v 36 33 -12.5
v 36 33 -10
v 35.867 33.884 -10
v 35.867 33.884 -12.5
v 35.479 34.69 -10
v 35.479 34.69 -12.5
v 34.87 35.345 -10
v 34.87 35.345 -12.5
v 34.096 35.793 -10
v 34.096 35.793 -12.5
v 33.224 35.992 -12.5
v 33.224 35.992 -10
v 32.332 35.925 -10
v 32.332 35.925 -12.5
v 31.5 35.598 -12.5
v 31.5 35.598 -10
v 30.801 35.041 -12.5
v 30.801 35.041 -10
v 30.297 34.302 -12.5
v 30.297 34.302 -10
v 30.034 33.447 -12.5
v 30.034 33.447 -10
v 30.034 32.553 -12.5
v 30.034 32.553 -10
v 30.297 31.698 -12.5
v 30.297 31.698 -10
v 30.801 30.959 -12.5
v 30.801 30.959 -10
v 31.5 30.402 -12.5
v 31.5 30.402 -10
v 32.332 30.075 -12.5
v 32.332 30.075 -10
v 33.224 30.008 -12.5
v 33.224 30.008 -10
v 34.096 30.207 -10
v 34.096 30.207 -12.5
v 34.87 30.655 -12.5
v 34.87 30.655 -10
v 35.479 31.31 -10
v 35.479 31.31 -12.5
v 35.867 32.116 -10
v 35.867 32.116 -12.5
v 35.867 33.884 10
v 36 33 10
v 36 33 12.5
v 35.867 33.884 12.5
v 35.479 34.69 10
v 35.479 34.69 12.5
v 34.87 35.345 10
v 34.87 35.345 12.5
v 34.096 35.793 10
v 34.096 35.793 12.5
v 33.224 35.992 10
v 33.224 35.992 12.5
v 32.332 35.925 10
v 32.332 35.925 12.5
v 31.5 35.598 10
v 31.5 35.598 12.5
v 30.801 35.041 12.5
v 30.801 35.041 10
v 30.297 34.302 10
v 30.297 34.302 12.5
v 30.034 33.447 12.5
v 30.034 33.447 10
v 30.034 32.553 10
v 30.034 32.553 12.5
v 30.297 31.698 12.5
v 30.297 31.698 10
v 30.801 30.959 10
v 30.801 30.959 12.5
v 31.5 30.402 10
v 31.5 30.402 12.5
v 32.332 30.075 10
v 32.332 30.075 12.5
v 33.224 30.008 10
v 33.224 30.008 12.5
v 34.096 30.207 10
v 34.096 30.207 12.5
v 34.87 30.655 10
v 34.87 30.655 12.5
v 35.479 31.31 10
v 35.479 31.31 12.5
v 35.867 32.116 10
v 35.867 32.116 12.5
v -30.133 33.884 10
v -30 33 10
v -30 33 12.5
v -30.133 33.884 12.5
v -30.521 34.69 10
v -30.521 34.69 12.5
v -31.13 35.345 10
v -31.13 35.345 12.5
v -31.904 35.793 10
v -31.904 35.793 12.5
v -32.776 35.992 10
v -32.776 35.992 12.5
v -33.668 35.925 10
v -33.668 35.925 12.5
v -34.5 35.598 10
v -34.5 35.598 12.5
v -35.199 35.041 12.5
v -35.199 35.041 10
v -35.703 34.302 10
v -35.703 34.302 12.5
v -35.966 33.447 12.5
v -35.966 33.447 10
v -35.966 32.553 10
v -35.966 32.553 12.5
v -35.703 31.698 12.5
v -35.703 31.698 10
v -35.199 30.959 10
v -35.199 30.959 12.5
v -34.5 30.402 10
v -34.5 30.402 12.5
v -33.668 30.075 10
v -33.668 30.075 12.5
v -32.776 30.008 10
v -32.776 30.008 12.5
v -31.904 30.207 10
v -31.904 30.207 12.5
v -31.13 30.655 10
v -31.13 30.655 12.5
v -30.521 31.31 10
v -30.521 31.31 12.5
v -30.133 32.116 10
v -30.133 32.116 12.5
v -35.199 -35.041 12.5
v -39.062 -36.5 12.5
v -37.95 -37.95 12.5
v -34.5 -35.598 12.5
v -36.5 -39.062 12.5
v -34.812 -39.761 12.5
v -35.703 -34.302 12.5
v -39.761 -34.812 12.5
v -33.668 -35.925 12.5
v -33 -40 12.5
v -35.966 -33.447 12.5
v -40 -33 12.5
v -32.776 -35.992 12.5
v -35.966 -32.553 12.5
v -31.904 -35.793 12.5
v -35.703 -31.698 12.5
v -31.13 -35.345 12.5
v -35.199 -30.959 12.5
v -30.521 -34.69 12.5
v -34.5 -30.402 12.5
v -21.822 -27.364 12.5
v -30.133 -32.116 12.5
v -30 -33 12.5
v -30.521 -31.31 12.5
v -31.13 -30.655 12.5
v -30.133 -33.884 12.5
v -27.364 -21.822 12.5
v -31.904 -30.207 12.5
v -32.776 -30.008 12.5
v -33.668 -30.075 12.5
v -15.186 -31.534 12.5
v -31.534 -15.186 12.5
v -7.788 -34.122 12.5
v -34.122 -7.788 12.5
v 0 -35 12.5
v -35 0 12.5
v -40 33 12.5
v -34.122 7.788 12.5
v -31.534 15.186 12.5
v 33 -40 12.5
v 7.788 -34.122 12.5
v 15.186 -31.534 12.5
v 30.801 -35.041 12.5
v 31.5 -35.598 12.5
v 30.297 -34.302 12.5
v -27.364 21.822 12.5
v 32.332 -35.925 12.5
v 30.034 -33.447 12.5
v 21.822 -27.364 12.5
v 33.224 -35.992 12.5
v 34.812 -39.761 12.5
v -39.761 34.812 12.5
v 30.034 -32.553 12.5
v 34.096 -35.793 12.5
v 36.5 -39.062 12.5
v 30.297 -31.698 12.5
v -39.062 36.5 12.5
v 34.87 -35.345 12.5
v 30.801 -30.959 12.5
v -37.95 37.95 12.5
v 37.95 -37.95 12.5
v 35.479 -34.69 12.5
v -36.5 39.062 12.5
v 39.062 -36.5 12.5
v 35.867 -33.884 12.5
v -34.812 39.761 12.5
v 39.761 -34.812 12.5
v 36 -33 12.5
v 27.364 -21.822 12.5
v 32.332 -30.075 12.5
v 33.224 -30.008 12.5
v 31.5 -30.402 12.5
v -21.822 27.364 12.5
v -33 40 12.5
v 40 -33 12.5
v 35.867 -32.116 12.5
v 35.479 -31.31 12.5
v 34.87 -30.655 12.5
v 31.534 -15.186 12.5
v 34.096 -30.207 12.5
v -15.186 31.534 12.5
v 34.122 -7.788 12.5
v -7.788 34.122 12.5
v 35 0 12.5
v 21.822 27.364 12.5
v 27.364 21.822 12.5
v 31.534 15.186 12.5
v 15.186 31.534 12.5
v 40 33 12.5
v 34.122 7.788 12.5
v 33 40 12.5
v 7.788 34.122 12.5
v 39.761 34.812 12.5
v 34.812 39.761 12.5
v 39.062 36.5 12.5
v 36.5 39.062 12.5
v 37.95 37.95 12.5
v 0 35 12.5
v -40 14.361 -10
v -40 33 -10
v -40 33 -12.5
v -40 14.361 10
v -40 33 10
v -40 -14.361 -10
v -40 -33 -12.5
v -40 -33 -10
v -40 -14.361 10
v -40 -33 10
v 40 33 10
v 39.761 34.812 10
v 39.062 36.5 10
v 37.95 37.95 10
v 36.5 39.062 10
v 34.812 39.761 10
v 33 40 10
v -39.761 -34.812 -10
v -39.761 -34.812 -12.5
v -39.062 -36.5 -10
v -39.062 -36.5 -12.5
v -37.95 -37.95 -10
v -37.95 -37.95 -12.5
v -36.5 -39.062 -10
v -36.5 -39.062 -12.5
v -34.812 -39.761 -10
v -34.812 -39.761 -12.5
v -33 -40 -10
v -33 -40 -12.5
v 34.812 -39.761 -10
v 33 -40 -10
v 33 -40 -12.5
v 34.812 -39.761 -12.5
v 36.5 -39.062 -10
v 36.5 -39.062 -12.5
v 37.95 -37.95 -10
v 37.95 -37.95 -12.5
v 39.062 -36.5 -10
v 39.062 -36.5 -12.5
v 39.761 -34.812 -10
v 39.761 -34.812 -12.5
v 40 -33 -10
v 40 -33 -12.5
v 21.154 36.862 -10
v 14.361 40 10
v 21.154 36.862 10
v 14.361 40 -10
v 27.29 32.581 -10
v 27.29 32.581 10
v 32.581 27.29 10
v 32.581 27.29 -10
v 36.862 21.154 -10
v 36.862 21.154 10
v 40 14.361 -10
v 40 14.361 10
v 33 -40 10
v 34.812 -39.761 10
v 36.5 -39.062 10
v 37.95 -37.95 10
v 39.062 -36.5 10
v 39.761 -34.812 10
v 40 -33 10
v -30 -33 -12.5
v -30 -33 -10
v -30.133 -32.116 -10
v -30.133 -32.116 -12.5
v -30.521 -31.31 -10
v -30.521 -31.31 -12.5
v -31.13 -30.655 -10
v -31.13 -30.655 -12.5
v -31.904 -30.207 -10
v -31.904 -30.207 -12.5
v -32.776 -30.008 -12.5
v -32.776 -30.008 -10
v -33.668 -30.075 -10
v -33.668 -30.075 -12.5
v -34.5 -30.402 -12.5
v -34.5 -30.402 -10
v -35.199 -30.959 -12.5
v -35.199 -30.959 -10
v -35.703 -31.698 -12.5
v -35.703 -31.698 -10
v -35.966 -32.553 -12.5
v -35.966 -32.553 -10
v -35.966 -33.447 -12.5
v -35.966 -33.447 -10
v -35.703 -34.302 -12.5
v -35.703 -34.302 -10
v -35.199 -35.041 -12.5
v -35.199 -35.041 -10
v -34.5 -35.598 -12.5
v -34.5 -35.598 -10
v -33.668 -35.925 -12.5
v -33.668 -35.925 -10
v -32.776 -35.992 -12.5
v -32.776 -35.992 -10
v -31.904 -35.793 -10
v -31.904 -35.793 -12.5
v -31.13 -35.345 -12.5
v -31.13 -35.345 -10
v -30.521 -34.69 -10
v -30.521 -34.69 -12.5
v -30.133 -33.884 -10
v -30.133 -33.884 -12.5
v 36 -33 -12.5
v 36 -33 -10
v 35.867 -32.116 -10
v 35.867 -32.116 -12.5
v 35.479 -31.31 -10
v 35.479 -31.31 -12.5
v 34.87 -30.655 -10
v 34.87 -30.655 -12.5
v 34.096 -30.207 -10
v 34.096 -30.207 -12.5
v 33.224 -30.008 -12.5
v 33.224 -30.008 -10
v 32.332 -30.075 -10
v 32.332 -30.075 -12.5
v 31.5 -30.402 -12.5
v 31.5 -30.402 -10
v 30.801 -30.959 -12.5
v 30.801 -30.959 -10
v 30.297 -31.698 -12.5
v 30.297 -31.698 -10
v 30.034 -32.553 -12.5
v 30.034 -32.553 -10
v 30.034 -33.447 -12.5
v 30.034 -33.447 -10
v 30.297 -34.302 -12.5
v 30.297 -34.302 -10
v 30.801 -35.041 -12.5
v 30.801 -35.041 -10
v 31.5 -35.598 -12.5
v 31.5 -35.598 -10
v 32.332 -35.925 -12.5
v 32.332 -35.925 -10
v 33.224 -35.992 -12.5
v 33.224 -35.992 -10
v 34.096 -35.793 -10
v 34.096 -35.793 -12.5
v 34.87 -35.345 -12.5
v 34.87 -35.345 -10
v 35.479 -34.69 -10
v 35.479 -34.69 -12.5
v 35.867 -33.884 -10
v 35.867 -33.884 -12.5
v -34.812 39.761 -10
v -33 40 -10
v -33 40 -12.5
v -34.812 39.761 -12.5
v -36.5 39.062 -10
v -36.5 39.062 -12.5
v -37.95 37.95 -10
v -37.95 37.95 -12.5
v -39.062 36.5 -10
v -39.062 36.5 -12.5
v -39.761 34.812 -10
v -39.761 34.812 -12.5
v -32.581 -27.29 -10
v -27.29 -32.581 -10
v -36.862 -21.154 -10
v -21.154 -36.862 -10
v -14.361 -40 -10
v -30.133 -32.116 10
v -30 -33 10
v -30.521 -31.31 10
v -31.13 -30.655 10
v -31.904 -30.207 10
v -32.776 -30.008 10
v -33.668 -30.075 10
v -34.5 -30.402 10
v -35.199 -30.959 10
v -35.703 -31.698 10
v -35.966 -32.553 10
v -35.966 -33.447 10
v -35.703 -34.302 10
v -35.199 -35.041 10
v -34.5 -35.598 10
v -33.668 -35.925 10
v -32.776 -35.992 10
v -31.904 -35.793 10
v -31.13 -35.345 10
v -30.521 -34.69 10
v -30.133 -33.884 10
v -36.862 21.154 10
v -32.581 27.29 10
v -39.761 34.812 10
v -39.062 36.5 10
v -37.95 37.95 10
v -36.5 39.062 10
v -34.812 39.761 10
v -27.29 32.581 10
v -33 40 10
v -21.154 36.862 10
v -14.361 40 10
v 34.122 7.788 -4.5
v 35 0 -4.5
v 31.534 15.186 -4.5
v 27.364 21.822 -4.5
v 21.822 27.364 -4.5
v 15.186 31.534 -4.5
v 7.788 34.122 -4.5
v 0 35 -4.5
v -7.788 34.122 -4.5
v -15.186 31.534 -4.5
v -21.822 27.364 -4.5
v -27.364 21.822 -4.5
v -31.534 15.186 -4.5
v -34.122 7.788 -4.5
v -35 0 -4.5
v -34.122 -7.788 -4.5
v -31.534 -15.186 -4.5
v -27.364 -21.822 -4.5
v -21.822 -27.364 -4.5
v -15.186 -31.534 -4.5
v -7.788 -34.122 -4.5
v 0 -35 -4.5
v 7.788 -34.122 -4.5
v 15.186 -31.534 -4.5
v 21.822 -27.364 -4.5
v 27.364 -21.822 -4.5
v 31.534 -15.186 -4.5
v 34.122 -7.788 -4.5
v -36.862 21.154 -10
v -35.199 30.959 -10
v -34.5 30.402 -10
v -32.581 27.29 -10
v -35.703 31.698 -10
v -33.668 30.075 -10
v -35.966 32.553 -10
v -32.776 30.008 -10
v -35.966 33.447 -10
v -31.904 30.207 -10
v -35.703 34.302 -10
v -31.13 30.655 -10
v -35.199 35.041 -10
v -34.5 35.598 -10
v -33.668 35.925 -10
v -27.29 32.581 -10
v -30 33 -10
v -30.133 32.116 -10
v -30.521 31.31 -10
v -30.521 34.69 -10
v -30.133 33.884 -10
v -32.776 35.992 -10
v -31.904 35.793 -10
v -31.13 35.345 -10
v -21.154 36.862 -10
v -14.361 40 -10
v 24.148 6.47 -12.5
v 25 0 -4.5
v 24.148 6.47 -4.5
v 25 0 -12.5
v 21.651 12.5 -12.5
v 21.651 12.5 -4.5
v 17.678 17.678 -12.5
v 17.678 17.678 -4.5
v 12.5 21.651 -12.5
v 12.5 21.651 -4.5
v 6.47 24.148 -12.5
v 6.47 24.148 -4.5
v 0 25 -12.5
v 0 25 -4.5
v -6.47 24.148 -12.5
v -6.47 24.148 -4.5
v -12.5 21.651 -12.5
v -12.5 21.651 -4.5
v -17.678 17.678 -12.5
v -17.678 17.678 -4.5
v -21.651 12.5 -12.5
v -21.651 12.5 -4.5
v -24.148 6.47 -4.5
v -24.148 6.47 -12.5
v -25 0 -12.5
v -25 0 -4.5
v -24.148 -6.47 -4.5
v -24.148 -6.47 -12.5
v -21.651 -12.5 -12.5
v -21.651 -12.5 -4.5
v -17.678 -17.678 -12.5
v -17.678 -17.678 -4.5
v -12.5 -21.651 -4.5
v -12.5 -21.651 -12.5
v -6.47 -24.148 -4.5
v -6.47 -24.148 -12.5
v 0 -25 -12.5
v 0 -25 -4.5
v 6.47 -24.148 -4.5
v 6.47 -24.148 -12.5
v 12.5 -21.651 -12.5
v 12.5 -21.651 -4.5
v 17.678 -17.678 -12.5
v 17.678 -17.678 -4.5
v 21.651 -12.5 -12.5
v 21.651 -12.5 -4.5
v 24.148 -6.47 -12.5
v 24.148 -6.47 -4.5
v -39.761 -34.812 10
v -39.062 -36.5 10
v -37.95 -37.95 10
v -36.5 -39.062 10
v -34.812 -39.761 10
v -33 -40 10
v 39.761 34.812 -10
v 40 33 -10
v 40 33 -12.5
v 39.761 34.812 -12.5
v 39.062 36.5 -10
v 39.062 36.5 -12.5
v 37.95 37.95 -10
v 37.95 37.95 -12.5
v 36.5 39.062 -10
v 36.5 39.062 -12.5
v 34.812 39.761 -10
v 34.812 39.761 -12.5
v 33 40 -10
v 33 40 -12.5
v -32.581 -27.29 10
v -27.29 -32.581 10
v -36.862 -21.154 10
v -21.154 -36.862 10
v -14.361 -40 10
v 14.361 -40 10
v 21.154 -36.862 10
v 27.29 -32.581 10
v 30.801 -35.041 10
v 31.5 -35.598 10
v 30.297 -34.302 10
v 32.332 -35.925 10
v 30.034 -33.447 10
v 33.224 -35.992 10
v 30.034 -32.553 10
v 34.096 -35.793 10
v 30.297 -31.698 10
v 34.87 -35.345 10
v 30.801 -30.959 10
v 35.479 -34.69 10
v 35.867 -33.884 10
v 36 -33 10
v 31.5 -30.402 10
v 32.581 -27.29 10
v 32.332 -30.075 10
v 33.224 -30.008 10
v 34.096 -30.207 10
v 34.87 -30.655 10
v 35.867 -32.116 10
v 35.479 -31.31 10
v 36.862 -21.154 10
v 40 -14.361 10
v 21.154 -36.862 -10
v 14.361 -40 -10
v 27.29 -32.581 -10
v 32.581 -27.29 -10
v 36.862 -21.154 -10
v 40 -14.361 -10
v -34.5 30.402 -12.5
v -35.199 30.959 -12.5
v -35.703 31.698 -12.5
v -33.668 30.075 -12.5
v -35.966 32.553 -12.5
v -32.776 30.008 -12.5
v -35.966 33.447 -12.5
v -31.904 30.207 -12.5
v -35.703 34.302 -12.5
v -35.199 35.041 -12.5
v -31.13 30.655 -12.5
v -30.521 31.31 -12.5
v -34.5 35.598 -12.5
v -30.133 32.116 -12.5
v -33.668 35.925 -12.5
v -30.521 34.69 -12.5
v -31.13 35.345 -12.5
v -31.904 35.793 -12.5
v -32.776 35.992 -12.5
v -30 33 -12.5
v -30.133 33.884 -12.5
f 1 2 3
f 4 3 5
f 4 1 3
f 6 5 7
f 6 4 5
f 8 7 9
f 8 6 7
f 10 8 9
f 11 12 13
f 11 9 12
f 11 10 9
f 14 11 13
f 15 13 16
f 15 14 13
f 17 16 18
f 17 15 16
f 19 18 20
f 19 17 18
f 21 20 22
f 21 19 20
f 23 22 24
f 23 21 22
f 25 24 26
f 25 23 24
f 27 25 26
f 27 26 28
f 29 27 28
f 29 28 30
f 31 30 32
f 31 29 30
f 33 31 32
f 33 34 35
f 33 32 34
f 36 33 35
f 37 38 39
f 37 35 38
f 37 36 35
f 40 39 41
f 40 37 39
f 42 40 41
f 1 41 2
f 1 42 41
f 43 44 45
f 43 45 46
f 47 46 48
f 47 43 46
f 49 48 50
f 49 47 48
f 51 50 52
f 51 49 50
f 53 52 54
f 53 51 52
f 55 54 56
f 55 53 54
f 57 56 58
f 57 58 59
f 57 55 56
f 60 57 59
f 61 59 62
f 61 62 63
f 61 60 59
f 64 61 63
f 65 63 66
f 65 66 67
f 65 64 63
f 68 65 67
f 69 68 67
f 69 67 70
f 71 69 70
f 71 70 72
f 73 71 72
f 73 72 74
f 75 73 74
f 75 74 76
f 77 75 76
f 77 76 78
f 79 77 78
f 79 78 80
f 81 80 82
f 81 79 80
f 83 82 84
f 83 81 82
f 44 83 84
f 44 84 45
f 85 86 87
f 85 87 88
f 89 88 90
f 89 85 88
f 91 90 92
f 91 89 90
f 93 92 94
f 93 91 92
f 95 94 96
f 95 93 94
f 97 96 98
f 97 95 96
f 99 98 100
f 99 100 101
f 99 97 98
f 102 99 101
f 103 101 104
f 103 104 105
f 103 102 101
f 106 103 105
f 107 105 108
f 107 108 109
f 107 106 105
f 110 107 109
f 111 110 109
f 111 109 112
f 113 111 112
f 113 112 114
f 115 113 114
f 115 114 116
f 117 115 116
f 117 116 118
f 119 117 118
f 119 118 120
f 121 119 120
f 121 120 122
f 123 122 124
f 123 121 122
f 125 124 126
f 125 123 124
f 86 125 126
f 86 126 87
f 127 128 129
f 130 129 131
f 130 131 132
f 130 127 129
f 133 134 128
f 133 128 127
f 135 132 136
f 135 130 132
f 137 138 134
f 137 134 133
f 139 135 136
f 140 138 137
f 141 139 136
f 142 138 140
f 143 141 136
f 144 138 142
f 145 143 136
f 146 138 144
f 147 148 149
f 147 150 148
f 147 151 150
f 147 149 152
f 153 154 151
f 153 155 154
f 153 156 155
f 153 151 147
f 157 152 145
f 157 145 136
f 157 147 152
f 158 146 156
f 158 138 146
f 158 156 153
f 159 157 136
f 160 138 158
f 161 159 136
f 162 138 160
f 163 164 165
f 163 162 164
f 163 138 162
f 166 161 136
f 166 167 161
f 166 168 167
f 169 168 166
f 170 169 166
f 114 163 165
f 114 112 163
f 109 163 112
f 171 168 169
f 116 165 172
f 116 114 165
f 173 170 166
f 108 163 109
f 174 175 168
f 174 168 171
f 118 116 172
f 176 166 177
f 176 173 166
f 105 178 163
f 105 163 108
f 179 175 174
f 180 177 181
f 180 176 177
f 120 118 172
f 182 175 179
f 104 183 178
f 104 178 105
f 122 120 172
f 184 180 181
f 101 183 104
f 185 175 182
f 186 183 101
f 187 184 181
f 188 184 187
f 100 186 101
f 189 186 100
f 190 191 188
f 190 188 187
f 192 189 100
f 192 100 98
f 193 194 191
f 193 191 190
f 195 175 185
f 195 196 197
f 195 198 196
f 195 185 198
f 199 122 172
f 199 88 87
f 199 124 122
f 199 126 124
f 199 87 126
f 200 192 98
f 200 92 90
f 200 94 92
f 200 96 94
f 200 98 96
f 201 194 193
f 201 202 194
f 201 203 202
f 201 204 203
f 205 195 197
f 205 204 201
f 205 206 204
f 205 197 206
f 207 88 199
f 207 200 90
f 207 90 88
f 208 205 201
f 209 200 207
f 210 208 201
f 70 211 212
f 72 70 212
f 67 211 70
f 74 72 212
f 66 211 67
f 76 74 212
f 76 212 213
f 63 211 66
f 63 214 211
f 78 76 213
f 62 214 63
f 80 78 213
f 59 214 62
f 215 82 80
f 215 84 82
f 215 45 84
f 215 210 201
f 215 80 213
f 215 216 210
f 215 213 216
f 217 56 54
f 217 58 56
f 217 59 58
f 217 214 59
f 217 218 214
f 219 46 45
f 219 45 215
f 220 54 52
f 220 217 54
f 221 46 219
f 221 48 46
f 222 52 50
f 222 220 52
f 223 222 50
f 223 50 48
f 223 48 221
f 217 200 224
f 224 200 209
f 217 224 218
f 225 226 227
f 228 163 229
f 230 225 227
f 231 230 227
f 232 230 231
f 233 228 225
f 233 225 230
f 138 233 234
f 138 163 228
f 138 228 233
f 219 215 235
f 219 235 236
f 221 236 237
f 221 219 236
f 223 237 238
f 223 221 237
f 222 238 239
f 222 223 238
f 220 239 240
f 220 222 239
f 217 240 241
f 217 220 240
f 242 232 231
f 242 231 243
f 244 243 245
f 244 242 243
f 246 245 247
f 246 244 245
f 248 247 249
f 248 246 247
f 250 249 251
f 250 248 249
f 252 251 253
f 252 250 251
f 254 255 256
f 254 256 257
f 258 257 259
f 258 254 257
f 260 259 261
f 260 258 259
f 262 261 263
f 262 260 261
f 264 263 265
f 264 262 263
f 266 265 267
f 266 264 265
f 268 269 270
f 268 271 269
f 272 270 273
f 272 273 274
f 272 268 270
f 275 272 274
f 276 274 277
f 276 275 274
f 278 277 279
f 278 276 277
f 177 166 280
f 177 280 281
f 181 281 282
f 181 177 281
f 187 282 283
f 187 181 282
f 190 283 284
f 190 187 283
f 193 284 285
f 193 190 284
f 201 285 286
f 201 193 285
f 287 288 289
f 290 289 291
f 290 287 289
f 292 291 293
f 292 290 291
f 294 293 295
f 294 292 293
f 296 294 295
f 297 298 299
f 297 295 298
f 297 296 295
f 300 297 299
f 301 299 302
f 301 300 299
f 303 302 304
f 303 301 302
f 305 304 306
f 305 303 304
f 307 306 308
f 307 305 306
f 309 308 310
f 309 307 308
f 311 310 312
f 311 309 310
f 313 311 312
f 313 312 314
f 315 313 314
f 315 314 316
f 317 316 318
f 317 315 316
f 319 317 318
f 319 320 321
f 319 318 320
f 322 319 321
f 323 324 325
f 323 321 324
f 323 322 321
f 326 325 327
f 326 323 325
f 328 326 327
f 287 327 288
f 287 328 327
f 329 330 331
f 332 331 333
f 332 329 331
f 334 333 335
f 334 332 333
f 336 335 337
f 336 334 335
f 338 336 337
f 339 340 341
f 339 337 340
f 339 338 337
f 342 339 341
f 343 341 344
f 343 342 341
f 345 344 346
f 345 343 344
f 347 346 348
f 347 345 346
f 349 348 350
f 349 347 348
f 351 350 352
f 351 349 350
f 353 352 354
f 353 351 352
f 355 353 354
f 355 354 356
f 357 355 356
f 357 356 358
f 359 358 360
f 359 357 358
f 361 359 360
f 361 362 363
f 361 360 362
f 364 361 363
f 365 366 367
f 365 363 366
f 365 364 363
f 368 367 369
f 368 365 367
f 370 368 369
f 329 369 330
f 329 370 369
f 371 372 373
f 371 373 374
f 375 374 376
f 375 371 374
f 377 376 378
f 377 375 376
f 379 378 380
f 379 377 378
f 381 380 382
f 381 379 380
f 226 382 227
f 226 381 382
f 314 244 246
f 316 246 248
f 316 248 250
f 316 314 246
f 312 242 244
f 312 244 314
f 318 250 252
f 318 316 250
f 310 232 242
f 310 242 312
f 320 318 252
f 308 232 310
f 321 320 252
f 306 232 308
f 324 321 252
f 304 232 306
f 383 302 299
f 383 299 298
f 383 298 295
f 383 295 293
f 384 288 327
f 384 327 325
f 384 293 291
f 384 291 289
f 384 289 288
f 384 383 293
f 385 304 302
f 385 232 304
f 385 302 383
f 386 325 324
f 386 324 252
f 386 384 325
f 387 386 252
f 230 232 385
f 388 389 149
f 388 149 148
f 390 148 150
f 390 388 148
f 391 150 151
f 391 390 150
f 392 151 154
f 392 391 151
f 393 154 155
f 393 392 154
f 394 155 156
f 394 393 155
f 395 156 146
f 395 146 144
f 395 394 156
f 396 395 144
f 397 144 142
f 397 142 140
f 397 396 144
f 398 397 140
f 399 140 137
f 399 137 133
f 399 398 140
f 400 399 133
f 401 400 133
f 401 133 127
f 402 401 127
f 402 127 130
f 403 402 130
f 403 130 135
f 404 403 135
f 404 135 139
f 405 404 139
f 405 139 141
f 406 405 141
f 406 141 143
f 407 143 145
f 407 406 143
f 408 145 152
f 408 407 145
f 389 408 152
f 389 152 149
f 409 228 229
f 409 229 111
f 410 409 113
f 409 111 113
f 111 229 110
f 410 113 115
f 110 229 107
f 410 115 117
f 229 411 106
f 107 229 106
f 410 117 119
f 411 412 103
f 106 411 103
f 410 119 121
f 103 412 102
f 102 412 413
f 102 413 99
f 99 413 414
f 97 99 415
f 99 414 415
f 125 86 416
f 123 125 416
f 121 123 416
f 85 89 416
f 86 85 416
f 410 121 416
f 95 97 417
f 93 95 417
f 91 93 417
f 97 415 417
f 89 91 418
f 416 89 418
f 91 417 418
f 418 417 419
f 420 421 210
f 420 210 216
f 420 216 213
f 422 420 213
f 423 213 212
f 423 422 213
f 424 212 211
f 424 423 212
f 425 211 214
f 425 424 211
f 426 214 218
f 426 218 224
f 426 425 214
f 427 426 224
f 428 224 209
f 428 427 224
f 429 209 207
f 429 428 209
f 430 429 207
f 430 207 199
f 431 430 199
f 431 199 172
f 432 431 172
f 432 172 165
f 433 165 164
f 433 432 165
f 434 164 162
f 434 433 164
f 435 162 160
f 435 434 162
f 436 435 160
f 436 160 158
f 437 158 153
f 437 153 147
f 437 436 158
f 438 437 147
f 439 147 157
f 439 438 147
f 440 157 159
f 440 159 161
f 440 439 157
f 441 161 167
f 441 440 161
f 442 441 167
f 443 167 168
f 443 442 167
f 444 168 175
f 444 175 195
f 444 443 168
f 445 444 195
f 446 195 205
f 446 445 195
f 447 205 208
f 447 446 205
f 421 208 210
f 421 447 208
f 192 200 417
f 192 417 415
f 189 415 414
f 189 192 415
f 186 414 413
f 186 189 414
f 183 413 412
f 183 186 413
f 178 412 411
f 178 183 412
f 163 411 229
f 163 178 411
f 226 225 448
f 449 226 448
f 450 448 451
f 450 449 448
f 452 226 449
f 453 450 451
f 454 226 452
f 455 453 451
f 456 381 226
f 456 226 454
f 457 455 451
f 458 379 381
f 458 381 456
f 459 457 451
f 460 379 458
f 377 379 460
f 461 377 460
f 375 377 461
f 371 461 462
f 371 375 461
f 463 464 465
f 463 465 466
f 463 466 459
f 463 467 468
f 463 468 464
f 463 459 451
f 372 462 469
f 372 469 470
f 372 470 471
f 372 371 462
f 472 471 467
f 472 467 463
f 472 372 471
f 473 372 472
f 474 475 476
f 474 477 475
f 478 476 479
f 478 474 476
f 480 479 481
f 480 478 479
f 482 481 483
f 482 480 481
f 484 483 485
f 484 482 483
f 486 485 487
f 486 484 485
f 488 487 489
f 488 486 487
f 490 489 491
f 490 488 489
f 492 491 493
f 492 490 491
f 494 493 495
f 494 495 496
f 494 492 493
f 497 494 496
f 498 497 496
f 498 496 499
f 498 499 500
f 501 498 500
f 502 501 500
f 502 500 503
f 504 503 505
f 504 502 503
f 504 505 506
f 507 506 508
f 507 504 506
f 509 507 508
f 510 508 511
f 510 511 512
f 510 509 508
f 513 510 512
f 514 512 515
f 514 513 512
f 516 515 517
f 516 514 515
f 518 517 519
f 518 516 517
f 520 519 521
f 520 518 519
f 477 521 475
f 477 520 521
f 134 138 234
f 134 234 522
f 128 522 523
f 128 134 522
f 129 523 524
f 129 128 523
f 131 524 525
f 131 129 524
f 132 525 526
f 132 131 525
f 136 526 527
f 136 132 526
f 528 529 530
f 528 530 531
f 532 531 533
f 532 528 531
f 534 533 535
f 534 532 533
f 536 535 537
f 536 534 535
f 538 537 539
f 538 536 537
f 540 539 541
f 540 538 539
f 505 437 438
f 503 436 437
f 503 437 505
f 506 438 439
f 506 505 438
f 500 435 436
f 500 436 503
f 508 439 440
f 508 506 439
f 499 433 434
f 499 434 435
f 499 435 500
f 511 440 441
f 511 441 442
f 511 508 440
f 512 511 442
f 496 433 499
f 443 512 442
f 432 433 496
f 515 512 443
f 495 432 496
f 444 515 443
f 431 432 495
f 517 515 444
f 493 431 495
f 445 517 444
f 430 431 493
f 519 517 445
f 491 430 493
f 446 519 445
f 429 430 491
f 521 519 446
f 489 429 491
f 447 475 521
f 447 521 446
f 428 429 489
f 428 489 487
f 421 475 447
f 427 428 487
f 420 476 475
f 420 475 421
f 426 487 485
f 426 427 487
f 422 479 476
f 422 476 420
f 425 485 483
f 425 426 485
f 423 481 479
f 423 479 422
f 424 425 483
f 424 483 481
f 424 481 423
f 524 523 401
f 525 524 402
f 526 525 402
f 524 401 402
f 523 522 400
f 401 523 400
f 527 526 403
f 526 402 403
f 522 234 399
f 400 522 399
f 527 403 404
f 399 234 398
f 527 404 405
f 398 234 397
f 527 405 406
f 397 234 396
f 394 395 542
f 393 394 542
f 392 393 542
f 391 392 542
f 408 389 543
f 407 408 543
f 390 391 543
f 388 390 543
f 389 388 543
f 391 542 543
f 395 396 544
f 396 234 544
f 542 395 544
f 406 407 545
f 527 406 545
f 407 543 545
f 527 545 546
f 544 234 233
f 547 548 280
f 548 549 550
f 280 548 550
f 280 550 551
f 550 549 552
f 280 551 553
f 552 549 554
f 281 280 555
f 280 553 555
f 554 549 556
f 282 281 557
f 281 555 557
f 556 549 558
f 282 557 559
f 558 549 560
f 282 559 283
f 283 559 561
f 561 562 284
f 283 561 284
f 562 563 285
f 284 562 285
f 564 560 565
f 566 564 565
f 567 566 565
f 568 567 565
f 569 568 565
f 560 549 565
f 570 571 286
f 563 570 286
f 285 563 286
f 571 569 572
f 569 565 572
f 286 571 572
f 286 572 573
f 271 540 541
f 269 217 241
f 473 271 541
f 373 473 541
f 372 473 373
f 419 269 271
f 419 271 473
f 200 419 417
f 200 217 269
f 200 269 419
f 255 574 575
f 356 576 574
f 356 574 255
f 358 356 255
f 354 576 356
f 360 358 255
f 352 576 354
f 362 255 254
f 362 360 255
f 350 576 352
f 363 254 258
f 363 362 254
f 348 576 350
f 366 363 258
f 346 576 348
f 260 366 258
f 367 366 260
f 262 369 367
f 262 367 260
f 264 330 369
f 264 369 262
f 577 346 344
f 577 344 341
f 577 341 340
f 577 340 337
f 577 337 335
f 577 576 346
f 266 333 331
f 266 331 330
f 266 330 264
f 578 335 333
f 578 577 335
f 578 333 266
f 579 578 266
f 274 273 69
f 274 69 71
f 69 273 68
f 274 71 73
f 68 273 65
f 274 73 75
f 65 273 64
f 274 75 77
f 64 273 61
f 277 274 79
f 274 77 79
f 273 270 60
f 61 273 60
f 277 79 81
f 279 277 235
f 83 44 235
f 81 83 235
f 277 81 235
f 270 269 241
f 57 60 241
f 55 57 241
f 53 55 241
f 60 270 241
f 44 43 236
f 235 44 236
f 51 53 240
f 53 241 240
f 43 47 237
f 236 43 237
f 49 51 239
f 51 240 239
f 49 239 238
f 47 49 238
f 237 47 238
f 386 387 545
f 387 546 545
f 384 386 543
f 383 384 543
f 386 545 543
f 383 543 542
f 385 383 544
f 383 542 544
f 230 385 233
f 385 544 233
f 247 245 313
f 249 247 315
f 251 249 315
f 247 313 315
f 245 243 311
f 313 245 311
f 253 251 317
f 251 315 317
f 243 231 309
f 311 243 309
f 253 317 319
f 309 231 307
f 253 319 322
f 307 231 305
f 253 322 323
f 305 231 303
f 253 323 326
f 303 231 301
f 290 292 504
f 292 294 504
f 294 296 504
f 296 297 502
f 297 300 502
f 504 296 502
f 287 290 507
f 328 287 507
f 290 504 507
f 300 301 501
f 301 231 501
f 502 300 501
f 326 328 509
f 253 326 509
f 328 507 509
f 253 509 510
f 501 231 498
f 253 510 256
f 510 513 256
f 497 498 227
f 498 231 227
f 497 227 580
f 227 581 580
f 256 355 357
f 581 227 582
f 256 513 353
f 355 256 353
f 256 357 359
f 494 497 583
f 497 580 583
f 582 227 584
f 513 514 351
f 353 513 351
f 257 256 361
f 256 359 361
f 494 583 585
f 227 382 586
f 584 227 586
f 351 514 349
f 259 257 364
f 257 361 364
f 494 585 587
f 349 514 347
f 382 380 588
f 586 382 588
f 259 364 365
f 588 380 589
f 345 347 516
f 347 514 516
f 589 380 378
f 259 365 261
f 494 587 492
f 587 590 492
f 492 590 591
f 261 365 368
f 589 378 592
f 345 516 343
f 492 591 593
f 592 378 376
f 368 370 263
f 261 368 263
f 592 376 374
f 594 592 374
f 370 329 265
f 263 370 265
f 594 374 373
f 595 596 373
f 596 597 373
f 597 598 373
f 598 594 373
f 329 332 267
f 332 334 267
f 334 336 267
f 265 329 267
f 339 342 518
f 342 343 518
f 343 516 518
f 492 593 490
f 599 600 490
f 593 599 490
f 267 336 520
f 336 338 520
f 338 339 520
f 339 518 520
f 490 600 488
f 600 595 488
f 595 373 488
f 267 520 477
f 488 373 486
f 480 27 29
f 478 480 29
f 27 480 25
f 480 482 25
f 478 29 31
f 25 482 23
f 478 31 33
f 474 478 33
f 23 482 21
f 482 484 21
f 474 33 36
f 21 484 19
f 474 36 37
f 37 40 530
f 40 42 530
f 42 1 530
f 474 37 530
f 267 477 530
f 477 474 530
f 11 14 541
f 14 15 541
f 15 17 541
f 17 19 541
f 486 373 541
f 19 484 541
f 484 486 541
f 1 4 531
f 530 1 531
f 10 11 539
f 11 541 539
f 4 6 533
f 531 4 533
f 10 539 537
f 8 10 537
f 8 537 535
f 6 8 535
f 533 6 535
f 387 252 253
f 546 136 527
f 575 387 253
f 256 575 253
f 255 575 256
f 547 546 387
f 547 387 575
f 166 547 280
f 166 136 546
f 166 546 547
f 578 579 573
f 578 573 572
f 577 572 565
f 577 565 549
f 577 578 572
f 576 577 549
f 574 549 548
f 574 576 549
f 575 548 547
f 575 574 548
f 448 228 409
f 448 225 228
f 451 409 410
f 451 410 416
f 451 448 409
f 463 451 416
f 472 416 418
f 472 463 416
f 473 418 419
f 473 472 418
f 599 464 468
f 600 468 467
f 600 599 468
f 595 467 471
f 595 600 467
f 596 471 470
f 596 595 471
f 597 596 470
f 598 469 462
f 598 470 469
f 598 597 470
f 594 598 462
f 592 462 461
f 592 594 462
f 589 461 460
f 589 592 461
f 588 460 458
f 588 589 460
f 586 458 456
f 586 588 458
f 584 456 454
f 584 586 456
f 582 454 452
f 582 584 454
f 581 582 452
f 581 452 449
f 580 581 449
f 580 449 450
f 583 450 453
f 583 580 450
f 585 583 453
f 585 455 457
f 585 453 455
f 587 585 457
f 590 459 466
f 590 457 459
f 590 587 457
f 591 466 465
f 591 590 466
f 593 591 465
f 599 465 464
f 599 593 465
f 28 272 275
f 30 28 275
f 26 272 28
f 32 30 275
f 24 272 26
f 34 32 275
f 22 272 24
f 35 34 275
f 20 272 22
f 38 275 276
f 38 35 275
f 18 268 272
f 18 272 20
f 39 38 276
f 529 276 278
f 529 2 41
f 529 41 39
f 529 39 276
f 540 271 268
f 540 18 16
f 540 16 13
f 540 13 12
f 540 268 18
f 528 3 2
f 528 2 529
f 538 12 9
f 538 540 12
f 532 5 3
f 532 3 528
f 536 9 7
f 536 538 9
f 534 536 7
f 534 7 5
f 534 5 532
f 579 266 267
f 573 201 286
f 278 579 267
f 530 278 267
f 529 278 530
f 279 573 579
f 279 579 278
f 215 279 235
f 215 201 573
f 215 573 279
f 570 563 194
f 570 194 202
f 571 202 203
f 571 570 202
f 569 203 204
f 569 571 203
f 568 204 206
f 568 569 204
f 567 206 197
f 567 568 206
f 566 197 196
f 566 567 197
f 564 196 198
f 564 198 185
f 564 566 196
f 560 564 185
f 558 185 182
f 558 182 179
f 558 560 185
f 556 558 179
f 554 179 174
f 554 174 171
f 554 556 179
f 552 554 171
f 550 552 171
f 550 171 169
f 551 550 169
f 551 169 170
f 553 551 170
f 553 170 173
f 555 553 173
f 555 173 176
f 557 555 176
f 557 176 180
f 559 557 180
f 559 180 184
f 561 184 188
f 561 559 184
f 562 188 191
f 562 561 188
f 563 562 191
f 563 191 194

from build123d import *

# Parameters (mm, degrees)
SKETCH1_R           = 25
SKETCH1_R_2         = 3
BOSS_EXTRUDE1_DEPTH = 12.5
CUT_EXTRUDE2_DEPTH  = 10
CUT_EXTRUDE3_START  = -4.5
SKETCH2_4_R         = 35
SKETCH2_4_R_2       = 25
CUT_EXTRUDE3_DEPTH  = 17


with BuildPart() as part:
    # Sketch1 → Boss-Extrude1 (new, symmetric)
    with BuildSketch(Plane.XY):
        with BuildLine():
            Line((-33, -40), (33, -40))
            ThreePointArc((33, -40), (37.949747468, -37.949747468), (40, -33))
            Line((40, -33), (40, 33))
            ThreePointArc((40, 33), (37.949747468, 37.949747468), (33, 40))
            Line((33, 40), (-33, 40))
            ThreePointArc((-33, 40), (-37.949747468, 37.949747468), (-40, 33))
            Line((-40, 33), (-40, -33))
            ThreePointArc((-40, -33), (-37.949747468, -37.949747468), (-33, -40))
        make_face()
        Circle(SKETCH1_R, mode=Mode.SUBTRACT)
        with Locations((-33, 33)):
            Circle(SKETCH1_R_2, mode=Mode.SUBTRACT)
        with Locations((33, 33)):
            Circle(SKETCH1_R_2, mode=Mode.SUBTRACT)
        with Locations((-33, -33)):
            Circle(SKETCH1_R_2, mode=Mode.SUBTRACT)
        with Locations((33, -33)):
            Circle(SKETCH1_R_2, mode=Mode.SUBTRACT)
    extrude(amount=BOSS_EXTRUDE1_DEPTH, both=True)

    # Sketch2 → Cut-Extrude2 (cut, symmetric)
    with BuildSketch(Plane.XY):
        with BuildLine():
            Line((-40, 33), (-40, 14.361406616))
            ThreePointArc((-40, 14.361406616), (-30.0520382, 30.0520382), (-14.361406616, 40))
            Line((-14.361406616, 40), (-33, 40))
            ThreePointArc((-33, 40), (-37.949747468, 37.949747468), (-40, 33))
        make_face()
        with BuildLine():
            Line((33, 40), (14.361406616, 40))
            ThreePointArc((14.361406616, 40), (30.0520382, 30.0520382), (40, 14.361406616))
            Line((40, 14.361406616), (40, 33))
            ThreePointArc((40, 33), (37.949747468, 37.949747468), (33, 40))
        make_face()
        with BuildLine():
            ThreePointArc((40, -14.361406616), (30.0520382, -30.0520382), (14.361406616, -40))
            Line((14.361406616, -40), (33, -40))
            ThreePointArc((33, -40), (37.949747468, -37.949747468), (40, -33))
            Line((40, -33), (40, -14.361406616))
        make_face()
        with BuildLine():
            ThreePointArc((-14.361406616, -40), (-30.0520382, -30.0520382), (-40, -14.361406616))
            Line((-40, -14.361406616), (-40, -33))
            ThreePointArc((-40, -33), (-37.949747468, -37.949747468), (-33, -40))
            Line((-33, -40), (-14.361406616, -40))
        make_face()
    extrude(amount=CUT_EXTRUDE2_DEPTH, both=True, mode=Mode.SUBTRACT)

    # Sketch2<4> → Cut-Extrude3 (cut)
    with BuildSketch(Plane.XY.offset(CUT_EXTRUDE3_START)):
        Circle(SKETCH2_4_R)
        Circle(SKETCH2_4_R_2, mode=Mode.SUBTRACT)
    extrude(amount=CUT_EXTRUDE3_DEPTH, mode=Mode.SUBTRACT)


solid = part.part
